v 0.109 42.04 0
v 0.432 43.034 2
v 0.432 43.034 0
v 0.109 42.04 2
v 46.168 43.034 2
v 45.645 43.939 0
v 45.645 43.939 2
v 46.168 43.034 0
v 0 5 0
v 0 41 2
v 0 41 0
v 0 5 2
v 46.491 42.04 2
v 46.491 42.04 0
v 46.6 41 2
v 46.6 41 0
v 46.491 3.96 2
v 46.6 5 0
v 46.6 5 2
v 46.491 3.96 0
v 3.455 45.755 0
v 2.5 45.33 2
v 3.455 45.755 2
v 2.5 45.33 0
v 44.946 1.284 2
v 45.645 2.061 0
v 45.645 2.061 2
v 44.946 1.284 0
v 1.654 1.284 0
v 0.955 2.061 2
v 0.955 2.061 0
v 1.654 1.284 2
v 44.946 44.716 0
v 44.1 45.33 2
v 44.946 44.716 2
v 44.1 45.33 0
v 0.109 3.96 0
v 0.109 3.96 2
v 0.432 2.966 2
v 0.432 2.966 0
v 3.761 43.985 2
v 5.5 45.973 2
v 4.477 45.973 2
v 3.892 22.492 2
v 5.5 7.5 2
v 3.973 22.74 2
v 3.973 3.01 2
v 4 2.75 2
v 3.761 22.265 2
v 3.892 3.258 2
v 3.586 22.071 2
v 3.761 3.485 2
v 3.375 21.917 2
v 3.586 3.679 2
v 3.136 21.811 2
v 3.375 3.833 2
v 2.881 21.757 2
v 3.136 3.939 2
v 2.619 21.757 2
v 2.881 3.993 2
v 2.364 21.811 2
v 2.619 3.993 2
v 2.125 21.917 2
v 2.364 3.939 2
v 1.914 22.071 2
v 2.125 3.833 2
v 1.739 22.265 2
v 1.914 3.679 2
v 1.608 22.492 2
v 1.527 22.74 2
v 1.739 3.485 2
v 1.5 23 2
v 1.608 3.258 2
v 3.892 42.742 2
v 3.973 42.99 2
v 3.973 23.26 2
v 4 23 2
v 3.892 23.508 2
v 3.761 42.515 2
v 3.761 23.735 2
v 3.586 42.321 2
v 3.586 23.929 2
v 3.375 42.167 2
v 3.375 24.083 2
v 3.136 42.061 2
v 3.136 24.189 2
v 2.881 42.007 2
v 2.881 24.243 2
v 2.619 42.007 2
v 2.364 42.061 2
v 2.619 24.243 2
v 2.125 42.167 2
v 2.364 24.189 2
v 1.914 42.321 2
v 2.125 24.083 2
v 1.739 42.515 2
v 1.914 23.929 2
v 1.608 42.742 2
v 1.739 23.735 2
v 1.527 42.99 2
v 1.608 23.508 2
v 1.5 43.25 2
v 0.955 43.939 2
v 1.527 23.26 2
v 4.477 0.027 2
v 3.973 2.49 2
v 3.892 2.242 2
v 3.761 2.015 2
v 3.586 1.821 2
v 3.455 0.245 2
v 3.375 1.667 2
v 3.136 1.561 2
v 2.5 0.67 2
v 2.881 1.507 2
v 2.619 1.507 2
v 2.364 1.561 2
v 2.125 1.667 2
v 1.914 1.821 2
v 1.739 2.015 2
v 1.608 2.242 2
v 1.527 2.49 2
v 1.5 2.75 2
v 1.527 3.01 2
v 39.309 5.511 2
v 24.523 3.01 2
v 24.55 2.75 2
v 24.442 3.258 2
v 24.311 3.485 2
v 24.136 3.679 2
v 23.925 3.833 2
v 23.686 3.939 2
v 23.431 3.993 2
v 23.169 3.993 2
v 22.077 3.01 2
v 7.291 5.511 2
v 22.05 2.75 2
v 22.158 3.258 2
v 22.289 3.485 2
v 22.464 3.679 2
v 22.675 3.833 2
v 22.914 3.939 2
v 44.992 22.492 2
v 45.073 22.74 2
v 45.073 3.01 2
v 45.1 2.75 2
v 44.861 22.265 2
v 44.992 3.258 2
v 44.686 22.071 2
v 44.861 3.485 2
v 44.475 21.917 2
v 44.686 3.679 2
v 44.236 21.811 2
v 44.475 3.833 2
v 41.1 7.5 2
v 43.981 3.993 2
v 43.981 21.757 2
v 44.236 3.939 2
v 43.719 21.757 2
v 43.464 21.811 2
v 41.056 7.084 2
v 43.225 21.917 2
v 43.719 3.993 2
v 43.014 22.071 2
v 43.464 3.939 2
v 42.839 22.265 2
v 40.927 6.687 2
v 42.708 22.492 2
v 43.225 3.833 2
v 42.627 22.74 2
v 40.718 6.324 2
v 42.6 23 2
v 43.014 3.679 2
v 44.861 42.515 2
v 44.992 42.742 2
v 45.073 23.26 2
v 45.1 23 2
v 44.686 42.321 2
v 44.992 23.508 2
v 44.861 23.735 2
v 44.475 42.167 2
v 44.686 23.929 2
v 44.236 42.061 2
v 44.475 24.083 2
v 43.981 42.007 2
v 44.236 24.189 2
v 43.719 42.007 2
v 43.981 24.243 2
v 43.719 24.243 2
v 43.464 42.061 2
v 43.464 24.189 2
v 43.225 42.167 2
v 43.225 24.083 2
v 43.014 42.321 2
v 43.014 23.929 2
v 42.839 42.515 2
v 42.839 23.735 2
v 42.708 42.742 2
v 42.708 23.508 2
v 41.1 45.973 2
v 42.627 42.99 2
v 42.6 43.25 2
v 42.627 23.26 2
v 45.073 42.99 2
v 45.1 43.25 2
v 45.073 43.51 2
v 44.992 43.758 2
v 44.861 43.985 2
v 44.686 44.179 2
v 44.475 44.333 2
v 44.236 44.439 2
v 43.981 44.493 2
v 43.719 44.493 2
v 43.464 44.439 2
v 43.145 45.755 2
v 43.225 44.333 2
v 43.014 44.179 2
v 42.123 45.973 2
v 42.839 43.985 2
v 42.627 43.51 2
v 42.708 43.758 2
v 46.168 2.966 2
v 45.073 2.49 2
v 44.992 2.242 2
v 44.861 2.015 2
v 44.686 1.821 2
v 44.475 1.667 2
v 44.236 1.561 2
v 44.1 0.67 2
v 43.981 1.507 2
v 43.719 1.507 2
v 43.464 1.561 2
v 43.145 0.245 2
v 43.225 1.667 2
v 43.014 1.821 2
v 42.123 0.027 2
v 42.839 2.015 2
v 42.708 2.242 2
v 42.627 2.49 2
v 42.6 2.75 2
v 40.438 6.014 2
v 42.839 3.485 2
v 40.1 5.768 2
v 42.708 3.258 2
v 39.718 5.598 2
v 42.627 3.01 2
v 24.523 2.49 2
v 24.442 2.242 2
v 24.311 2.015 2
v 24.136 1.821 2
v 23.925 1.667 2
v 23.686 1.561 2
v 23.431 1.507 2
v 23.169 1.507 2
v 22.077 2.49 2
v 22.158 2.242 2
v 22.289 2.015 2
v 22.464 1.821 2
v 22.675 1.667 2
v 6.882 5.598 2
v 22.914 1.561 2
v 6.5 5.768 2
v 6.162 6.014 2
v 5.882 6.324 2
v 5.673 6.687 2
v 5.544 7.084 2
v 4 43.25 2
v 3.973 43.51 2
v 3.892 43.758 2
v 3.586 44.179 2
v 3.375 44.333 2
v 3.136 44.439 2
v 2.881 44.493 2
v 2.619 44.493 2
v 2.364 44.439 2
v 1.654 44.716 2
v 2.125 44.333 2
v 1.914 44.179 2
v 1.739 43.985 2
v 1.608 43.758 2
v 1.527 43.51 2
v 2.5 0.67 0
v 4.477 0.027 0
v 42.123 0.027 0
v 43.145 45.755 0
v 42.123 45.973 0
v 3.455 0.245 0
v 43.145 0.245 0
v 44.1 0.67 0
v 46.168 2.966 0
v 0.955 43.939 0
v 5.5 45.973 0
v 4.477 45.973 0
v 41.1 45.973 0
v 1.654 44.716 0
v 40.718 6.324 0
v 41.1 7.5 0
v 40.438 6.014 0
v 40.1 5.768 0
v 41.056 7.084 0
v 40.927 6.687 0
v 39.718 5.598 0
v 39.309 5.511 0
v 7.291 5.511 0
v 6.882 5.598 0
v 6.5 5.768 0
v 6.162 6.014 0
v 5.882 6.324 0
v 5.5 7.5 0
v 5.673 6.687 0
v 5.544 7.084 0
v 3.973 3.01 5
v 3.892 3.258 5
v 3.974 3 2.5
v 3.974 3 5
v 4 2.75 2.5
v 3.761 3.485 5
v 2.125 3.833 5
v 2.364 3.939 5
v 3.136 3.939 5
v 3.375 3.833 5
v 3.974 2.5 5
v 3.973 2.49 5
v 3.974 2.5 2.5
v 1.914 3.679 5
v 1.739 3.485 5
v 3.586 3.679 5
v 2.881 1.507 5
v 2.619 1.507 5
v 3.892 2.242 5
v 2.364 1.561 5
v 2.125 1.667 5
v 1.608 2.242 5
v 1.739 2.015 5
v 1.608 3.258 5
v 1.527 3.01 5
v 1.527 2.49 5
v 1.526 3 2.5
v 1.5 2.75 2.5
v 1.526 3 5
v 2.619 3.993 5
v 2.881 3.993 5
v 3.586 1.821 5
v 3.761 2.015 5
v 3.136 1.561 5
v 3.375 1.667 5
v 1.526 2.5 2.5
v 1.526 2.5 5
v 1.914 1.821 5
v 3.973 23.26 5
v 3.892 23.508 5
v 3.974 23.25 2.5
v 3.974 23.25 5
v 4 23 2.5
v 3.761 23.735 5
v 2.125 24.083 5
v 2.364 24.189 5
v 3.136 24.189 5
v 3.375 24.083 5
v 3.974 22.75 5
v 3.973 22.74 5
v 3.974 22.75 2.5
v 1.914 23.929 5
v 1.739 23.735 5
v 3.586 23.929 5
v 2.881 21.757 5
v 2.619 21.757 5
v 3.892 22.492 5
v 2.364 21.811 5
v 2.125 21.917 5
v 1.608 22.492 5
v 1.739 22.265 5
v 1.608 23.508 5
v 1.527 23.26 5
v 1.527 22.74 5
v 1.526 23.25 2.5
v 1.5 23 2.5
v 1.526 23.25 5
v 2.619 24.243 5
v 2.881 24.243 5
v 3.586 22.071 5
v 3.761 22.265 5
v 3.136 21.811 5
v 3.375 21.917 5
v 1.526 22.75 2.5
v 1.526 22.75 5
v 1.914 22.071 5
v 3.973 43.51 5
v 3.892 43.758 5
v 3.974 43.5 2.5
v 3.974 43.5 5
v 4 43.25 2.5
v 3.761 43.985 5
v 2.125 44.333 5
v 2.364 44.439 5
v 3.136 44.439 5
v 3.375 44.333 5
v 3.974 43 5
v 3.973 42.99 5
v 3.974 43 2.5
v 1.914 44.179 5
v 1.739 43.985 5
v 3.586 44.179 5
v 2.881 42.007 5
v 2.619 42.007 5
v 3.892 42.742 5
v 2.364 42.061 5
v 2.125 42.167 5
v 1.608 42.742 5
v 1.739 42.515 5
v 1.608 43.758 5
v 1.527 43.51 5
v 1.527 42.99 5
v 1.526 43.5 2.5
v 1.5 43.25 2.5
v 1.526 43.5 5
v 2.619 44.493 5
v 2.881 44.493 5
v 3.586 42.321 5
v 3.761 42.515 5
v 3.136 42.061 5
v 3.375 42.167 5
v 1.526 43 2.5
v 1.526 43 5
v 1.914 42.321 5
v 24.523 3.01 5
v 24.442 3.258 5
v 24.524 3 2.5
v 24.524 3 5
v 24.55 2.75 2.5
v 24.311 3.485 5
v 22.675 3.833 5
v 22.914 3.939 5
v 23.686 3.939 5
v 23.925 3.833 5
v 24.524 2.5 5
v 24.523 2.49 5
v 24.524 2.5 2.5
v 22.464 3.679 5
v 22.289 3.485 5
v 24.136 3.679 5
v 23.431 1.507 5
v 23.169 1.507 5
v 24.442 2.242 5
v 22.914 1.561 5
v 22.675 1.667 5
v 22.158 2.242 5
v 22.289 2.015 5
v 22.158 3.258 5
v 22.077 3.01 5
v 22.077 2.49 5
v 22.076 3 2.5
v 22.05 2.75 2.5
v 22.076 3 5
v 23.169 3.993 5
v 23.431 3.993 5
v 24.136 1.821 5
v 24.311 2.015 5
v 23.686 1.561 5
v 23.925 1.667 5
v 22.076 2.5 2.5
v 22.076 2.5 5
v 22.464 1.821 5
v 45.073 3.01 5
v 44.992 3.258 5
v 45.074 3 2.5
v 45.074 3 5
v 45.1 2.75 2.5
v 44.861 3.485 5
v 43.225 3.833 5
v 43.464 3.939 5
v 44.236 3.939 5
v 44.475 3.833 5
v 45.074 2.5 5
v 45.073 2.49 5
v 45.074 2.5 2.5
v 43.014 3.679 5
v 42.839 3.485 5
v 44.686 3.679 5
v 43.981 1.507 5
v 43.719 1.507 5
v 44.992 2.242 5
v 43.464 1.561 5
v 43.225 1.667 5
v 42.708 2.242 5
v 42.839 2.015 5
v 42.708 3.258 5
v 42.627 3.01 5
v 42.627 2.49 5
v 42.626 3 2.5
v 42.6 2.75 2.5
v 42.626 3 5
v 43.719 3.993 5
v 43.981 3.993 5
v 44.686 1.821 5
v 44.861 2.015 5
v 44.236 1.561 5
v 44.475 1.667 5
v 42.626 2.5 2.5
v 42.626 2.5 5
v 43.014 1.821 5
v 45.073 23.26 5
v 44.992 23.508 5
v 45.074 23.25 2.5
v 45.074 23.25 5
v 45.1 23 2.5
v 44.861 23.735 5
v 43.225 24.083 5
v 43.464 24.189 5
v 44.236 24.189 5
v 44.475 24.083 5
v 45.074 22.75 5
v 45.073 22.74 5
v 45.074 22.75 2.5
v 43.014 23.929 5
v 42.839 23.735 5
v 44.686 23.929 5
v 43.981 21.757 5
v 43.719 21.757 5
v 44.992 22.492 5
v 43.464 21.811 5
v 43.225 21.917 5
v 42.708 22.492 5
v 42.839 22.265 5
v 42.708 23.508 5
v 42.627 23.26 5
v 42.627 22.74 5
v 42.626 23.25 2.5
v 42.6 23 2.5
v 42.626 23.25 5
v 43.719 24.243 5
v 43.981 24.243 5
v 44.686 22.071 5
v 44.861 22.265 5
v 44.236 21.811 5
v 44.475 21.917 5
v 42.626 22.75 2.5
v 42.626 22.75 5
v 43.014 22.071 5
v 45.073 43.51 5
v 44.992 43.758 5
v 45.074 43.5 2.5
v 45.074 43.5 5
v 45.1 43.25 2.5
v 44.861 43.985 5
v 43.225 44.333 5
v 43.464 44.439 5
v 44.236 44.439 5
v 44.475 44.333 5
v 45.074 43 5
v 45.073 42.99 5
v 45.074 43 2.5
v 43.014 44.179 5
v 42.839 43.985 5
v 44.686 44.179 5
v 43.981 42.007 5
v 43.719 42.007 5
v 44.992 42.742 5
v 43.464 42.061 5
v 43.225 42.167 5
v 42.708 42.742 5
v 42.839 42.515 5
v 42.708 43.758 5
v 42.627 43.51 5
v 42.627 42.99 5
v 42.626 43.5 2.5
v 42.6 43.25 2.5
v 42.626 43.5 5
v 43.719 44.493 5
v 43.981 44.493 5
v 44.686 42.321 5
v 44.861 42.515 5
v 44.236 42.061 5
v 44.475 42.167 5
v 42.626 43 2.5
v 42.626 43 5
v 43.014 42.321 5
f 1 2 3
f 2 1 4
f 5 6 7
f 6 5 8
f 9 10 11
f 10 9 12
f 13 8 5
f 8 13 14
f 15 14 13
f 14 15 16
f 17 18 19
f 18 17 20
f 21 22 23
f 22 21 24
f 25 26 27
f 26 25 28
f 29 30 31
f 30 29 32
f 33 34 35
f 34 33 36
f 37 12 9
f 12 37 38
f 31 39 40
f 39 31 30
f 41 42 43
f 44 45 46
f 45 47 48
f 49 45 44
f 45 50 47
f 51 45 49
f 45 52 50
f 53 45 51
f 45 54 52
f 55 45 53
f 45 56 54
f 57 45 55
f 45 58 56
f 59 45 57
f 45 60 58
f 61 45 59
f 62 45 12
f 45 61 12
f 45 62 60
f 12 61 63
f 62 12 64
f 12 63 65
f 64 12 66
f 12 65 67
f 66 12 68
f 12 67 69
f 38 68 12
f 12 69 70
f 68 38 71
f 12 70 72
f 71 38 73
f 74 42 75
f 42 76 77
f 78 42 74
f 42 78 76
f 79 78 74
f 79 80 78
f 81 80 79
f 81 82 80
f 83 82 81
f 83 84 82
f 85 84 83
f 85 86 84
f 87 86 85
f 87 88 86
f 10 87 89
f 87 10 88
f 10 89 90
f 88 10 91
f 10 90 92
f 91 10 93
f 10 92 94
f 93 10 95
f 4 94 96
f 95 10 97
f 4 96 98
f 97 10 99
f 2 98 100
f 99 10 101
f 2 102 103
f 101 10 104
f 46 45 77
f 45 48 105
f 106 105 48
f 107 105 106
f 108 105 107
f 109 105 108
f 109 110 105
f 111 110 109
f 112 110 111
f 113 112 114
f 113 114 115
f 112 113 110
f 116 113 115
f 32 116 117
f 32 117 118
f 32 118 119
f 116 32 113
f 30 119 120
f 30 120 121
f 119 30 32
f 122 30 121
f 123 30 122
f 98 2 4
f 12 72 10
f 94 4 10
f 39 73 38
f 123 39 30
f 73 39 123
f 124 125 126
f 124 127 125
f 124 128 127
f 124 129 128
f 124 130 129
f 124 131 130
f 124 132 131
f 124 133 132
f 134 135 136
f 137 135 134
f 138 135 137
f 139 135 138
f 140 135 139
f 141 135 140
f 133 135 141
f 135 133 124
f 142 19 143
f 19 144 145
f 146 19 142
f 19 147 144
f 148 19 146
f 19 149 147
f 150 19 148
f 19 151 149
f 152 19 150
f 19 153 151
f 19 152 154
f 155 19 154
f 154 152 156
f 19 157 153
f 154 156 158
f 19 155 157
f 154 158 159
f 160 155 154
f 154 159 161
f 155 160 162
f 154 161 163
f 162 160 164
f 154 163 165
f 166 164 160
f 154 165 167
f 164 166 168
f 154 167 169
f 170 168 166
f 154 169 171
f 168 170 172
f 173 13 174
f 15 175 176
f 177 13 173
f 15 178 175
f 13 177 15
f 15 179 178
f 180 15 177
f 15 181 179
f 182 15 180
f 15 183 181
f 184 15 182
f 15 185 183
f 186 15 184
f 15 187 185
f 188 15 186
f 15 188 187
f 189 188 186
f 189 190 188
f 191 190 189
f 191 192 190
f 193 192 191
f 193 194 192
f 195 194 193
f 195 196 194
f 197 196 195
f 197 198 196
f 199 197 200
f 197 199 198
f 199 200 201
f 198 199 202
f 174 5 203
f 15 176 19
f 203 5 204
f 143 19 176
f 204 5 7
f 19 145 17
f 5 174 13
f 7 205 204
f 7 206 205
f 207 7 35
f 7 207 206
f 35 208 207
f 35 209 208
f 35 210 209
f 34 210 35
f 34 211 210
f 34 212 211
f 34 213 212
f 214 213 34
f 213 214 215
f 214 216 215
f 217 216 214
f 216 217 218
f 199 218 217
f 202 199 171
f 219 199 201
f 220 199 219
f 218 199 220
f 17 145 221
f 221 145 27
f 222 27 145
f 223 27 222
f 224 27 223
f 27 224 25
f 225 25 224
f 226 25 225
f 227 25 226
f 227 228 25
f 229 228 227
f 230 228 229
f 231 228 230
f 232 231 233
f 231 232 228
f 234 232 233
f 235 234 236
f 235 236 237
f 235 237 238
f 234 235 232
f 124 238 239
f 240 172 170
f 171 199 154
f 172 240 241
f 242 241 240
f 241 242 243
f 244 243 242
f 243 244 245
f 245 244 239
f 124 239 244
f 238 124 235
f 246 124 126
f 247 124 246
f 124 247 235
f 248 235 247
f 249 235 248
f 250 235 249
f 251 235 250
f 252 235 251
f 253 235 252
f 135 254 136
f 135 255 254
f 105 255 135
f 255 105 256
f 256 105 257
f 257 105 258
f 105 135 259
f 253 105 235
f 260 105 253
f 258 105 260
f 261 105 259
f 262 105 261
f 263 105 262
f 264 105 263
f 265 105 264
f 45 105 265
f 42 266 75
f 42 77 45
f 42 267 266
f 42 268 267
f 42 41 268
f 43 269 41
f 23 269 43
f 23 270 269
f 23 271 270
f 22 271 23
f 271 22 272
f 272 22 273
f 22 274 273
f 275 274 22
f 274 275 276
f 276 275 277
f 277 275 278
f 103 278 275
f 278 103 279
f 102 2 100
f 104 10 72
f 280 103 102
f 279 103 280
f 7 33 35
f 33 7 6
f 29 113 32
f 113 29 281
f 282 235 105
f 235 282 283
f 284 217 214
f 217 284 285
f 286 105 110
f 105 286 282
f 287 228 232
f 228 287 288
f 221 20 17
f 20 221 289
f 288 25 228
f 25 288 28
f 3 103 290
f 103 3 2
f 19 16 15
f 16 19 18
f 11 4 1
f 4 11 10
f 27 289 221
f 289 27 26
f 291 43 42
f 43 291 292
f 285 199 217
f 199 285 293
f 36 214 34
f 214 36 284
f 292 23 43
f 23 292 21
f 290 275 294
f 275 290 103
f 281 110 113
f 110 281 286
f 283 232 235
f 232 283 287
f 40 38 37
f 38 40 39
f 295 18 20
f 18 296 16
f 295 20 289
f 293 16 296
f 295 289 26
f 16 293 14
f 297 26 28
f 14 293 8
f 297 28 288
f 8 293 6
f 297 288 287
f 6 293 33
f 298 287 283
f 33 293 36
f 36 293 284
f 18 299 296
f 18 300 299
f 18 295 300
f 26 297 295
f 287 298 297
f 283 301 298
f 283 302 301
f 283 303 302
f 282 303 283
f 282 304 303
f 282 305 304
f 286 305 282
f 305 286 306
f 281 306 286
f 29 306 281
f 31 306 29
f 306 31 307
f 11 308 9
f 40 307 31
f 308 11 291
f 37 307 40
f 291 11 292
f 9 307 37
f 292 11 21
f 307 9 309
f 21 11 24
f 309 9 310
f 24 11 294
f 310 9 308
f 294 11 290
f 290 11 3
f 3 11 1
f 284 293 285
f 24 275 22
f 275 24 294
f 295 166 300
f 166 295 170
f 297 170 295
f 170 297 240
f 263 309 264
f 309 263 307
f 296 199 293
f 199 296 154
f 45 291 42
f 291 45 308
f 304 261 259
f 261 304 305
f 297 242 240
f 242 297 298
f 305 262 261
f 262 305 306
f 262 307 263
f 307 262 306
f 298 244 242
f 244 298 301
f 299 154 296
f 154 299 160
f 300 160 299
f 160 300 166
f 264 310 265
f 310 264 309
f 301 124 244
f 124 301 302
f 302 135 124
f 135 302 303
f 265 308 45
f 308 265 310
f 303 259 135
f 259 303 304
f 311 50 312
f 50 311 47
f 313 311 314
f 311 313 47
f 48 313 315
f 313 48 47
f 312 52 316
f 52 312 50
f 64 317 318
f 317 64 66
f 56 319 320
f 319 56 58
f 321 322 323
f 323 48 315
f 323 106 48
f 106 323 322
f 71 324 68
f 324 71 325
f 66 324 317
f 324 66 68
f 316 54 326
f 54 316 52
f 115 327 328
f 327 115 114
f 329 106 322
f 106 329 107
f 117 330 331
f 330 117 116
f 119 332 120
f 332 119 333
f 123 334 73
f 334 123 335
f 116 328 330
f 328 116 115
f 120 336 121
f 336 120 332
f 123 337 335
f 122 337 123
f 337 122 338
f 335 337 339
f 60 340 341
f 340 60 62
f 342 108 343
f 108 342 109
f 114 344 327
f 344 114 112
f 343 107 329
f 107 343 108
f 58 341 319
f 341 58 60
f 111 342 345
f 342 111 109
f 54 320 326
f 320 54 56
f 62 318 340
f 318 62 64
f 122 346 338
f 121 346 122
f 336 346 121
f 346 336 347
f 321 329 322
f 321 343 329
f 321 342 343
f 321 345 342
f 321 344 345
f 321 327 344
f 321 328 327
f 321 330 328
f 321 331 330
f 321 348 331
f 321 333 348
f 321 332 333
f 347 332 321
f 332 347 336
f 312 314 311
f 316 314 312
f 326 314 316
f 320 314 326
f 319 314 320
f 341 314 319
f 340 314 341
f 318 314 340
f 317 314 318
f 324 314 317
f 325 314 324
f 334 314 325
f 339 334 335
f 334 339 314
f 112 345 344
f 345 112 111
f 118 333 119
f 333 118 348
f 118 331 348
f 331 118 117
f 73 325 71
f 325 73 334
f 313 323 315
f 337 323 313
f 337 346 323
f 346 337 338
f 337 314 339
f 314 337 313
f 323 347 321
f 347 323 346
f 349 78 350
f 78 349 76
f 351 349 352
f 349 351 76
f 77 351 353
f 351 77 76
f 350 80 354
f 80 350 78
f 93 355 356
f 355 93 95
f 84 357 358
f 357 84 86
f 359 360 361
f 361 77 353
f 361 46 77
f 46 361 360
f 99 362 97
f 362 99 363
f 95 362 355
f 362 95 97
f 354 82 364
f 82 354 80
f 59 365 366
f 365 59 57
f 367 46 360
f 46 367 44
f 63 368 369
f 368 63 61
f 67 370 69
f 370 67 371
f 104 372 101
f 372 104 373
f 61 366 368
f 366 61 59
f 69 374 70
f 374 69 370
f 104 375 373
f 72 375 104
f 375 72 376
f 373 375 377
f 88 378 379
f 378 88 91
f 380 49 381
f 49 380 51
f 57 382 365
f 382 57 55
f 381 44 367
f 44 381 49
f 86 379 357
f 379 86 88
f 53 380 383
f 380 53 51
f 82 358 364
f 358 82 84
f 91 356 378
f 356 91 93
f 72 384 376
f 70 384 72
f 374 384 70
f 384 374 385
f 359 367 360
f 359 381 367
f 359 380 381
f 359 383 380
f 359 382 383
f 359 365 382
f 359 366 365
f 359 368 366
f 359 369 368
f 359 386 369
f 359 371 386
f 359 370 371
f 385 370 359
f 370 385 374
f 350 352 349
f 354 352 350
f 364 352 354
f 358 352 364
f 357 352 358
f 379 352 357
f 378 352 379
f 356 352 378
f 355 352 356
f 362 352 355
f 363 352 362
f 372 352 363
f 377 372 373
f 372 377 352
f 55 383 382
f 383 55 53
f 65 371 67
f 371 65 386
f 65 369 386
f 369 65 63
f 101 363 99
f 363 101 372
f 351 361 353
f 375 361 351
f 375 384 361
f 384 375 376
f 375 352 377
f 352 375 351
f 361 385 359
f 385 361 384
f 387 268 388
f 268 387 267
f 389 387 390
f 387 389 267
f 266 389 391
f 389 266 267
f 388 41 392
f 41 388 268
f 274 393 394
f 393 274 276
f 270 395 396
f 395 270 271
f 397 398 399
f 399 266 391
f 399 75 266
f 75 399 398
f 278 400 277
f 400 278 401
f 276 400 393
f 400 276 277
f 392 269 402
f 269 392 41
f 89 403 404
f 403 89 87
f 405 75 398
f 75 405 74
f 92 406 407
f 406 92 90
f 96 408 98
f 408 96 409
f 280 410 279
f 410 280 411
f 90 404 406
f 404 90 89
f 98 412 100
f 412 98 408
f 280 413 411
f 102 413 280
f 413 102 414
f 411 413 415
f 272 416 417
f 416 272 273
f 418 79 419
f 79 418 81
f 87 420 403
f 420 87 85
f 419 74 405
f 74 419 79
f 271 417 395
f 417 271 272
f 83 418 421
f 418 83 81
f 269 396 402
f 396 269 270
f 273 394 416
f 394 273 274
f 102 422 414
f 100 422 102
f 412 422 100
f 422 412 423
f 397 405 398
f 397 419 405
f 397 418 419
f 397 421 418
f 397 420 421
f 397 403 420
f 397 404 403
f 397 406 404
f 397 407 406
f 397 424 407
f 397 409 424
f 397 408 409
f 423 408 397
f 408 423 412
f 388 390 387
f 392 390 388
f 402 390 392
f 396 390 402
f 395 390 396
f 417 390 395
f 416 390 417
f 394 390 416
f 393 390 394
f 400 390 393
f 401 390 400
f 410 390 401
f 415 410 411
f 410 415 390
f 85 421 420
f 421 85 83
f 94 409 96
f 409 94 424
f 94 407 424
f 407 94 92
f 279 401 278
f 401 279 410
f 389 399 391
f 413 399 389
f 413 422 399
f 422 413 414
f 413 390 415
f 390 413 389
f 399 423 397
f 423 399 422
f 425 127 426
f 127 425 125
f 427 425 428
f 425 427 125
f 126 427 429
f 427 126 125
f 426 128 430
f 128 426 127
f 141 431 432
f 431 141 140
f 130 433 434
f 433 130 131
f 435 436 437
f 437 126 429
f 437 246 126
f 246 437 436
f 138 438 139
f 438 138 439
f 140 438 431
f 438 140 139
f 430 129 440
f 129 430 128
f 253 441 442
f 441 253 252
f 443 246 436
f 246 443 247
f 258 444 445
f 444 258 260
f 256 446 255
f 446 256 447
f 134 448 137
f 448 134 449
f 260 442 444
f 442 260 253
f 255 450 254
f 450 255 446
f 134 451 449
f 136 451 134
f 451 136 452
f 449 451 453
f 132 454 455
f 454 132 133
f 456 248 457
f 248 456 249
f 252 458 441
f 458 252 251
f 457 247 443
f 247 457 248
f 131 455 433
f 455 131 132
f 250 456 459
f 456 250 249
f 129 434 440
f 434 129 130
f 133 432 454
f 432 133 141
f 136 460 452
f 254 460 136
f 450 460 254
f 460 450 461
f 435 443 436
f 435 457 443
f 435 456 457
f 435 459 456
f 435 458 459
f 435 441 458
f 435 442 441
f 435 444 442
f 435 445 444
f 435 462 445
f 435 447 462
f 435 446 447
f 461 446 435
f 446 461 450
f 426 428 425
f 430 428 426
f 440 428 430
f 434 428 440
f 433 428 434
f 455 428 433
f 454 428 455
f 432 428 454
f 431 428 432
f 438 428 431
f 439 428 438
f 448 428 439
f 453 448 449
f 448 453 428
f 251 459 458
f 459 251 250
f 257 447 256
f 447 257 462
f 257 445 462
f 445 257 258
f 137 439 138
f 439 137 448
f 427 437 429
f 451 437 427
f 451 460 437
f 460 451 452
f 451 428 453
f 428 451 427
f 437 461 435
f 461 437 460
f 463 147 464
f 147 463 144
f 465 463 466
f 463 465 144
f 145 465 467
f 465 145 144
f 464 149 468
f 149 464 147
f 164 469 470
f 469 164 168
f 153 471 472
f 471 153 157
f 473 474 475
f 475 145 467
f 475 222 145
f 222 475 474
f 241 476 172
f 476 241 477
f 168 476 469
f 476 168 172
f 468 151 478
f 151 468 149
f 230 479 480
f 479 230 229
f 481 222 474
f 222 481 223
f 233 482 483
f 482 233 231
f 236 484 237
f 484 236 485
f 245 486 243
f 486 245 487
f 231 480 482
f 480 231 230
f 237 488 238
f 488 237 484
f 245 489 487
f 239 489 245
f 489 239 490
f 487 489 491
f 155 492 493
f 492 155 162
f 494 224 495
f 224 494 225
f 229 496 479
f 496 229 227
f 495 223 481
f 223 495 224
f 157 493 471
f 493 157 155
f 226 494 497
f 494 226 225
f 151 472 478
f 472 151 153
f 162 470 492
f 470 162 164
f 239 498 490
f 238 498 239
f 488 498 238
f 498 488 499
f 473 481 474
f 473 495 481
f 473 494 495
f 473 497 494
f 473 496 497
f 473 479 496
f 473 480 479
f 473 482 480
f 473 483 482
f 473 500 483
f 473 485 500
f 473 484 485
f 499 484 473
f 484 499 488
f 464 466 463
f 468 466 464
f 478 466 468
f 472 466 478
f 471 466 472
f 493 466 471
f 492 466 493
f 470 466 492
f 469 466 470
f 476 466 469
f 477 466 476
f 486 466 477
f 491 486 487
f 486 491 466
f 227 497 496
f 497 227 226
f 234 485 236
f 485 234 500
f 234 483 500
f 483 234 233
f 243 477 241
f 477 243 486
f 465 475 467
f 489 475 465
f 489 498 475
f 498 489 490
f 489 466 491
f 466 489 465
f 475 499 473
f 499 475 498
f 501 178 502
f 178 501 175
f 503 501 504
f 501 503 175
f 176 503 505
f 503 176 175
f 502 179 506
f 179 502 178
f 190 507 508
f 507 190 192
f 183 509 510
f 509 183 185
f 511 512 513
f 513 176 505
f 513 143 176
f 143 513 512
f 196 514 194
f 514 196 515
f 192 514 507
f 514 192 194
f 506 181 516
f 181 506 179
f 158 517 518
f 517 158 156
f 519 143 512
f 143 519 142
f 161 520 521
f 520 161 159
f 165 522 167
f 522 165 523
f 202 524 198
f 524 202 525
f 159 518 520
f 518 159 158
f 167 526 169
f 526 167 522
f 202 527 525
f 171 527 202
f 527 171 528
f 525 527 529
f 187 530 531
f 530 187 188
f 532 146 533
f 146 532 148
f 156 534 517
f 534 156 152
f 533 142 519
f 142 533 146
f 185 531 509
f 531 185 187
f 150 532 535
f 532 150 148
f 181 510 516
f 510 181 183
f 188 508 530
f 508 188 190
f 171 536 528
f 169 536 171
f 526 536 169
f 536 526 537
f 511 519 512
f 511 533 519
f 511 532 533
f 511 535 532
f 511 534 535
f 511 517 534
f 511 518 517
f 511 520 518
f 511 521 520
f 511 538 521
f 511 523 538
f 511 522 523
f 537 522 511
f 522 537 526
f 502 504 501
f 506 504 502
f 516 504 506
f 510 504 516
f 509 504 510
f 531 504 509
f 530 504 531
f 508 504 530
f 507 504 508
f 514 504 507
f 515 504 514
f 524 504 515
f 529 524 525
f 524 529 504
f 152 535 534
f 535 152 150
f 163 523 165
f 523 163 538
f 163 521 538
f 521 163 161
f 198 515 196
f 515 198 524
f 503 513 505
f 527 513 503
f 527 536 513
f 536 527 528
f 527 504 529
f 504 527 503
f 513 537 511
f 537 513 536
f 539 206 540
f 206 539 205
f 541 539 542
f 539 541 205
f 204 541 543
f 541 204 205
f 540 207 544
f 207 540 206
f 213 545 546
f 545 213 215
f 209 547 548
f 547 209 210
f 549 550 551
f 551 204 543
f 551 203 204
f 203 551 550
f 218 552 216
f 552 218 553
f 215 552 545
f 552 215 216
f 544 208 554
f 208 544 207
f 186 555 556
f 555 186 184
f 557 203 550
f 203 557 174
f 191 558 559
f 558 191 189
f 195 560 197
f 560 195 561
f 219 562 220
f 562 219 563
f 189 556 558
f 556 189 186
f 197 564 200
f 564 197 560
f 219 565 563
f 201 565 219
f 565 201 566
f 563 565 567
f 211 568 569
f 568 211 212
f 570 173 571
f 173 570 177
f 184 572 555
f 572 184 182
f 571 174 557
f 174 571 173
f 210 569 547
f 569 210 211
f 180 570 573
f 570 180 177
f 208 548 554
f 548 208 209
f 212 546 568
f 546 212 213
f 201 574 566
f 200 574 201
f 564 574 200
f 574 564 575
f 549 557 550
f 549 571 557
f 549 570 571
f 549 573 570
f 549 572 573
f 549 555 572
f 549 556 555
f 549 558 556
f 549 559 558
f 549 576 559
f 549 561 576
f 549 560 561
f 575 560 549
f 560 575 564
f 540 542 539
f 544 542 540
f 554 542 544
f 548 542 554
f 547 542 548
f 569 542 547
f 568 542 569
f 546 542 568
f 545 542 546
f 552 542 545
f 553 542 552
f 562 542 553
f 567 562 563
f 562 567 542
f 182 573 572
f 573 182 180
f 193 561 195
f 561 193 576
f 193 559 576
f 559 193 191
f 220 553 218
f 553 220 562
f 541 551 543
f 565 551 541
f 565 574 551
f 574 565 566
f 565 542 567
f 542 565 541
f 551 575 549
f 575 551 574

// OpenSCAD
// Philipps Hue Dimmer Switch wall mount
// Authors:
// - Jonas "frdmn" Friedmann <j@frd.mn>
// - Marian "rnarian" Friedmann <hi@marianfriedmann.de>
// Licence: MIT License (MIT)

$fn = 30;

HOLDER_HEIGHT=2;
CLIP_HEIGHT=5;

// Holder brackt that keeps the dimmer switch in place
module holder(){
    // Function to draw an retangle with rounded corners
    module rounded_square(d,r) {
        minkowski() {
            translate([r,r]) square([d[0]-2*r, d[1]-2*r]);
            circle(r);
        }
    }

    difference(){
        linear_extrude(height=HOLDER_HEIGHT){
            rounded_square([46.6,46],5);
        }
        translate([5.5,5.5,0]){
            linear_extrude(height=HOLDER_HEIGHT){
                rounded_square([35.6,46], 2);
            }
        }
    }
}

// Clips to keep the holder in the base plate
module clip(){
    difference(){
        cylinder(h=CLIP_HEIGHT,d=2.5);
        translate([-2,-0.25,2.5]){
            cube([4,0.5,3]);
        }
    }
}

// Draw holder
holder();

// Draw each of the clips
translate([1.5+2.5/2,1.5+2.5/2,0]){
    // Bottom ones
    clip();
    translate([18.05+2.5,0,0]){
        clip();
        translate([18.05+2.5,0,0]){
            clip();
            // Right (horitonally) ones
            translate([0,17.75+2.5,0]){
                clip();
                translate([0,17.75+2.5,0]){
                    clip();
                }
            }
        }
    }
     // Left (horitonally) ones
    translate([0,17.75+2.5,0]){
        clip();
        translate([0,17.75+2.5,0]){
            clip();
        }
    }
}
